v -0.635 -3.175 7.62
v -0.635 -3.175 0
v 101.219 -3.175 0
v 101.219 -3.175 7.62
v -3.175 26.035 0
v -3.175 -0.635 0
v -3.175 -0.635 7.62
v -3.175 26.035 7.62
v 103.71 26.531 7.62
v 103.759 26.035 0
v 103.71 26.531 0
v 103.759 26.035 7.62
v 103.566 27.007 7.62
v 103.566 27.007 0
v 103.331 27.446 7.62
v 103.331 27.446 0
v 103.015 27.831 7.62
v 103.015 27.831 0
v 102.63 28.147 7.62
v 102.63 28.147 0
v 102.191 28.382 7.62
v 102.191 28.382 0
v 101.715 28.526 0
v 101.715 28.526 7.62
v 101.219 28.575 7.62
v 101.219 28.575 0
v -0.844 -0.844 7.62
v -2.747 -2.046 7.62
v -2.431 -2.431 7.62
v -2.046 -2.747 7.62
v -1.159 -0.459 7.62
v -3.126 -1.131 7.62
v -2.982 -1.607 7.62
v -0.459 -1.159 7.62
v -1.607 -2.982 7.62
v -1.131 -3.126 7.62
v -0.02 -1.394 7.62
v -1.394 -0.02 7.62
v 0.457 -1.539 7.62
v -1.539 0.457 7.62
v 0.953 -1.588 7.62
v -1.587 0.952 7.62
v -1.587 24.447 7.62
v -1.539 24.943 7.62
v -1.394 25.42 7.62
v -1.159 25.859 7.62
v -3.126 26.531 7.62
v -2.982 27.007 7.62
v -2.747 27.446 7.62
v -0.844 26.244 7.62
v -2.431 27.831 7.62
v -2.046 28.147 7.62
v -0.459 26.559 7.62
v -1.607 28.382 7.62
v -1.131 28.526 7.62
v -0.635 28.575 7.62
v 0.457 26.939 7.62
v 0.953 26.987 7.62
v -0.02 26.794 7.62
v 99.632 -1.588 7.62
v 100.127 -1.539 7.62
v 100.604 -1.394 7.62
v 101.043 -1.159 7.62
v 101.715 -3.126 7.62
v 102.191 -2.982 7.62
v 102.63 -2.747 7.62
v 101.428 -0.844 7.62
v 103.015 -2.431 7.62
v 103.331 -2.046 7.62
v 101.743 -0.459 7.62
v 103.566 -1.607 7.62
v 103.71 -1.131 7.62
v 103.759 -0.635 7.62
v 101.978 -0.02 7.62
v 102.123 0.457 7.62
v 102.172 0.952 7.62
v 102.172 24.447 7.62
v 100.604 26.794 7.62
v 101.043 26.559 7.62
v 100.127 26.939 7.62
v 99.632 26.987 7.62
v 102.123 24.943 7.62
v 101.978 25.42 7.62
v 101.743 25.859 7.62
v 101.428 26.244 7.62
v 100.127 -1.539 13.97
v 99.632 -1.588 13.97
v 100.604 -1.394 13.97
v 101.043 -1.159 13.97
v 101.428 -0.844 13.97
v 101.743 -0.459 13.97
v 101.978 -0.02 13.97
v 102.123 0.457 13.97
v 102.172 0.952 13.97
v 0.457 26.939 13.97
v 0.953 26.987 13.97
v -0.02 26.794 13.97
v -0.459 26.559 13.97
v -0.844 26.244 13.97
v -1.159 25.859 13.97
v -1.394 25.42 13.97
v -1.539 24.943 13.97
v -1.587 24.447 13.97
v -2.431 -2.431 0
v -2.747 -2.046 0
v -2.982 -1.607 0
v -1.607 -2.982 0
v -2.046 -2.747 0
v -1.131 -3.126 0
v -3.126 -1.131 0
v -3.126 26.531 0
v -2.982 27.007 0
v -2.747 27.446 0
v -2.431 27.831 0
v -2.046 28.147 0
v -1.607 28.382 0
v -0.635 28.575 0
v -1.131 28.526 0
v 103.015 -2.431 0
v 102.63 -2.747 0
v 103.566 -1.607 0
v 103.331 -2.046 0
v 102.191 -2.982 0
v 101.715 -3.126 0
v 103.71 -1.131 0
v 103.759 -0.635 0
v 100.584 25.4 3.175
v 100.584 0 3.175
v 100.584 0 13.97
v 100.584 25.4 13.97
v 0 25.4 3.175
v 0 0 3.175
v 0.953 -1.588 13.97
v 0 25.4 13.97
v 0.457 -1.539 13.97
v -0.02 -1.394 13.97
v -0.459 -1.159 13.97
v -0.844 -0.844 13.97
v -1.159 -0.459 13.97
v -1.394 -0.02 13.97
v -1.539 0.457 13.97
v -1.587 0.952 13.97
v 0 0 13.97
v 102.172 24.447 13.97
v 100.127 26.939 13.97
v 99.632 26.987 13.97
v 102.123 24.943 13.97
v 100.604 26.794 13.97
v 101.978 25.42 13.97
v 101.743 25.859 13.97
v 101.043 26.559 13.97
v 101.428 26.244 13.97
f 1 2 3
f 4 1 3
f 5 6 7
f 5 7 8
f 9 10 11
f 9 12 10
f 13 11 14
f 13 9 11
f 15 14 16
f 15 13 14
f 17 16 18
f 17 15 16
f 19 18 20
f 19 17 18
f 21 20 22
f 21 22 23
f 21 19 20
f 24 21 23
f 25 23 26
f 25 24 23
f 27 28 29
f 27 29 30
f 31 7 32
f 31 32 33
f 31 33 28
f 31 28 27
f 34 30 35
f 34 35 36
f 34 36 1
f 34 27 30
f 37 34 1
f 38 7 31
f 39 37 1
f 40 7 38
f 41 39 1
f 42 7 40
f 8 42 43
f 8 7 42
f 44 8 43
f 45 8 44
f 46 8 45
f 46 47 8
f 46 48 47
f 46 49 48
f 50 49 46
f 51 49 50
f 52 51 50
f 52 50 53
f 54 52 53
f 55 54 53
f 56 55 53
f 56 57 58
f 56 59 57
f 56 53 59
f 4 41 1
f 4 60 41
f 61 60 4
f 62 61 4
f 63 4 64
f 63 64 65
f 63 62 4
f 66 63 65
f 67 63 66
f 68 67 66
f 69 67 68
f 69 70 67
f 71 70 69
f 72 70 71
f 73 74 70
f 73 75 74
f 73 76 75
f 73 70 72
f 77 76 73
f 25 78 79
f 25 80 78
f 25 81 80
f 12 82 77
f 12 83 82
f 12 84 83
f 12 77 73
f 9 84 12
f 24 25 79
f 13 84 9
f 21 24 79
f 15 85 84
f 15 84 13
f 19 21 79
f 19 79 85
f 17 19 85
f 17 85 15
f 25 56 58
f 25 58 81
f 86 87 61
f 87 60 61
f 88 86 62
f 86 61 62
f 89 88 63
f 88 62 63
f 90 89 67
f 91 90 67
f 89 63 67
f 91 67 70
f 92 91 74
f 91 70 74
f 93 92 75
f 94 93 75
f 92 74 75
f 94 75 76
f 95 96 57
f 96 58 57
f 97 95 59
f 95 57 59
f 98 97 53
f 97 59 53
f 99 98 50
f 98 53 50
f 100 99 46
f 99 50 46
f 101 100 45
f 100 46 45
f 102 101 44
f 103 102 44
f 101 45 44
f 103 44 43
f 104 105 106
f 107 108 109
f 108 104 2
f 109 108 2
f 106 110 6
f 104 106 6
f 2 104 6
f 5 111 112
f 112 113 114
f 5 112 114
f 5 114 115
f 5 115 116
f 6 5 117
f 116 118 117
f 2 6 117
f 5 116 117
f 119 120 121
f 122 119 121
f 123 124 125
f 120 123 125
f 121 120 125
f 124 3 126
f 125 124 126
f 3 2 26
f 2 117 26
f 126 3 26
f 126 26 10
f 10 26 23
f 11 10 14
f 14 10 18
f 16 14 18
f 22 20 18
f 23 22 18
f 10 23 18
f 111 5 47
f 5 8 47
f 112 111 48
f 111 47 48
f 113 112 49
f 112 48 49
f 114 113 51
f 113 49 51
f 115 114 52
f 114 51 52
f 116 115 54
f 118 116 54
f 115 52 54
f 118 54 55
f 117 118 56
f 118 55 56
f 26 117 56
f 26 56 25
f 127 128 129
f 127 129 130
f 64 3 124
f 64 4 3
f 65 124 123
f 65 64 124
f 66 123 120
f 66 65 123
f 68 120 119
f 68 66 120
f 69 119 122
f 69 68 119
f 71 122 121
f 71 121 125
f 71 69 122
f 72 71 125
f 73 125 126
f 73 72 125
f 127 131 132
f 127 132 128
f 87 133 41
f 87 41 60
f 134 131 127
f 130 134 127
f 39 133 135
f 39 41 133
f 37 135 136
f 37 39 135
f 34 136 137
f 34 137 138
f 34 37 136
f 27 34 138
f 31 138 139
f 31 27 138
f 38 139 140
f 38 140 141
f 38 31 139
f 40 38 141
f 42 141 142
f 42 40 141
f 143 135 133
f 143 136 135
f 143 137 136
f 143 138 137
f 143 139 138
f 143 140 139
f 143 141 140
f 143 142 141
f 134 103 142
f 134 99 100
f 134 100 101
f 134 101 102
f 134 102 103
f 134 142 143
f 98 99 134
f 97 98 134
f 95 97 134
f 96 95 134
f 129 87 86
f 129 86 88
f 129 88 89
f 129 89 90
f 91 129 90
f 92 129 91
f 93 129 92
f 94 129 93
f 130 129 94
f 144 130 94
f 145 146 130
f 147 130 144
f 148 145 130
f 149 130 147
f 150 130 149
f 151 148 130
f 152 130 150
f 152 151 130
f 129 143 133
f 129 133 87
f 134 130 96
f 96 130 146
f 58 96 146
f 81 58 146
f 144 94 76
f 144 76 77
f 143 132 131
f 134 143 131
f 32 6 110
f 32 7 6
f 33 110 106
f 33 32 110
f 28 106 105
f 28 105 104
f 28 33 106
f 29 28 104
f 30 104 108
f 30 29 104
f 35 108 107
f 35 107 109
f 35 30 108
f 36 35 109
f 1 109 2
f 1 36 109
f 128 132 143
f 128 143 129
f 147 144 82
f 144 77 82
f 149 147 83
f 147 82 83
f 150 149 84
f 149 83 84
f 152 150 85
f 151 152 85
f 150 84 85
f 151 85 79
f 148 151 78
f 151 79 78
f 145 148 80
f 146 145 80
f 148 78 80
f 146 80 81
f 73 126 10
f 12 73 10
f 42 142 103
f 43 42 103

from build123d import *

# Parameters (mm, degrees)
F0_W     = 106.934
F0_H     = 31.75
F0_W_2   = 100.584
F0_H_2   = 25.4
F1_DEPTH = 13.97
F2_DEPTH = 3.175
F3_W     = 106.934
F3_H     = 31.75
F3_W_2   = 103.759
F3_H_2   = 28.575
F4_DEPTH = 6.35
F5_R     = 2.54


with BuildPart() as f1:
    # F0 (on Top) → F1 (new body)
    with BuildSketch(Plane.XY):
        with Locations((50.292, 12.7)):
            Rectangle(F0_W, F0_H)
        with Locations((50.292, 12.7)):
            Rectangle(F0_W_2, F0_H_2, mode=Mode.SUBTRACT)
    extrude(amount=F1_DEPTH)

    # F0 (on Top) → F2 (join)
    with BuildSketch(Plane.XY):
        with Locations((50.292, 12.7)):
            Rectangle(F0_W_2, F0_H_2)
    extrude(amount=F2_DEPTH)

    # F3 (on face) → F4 (cut)
    with BuildSketch(Plane.XY.offset(13.97)):
        with Locations((50.292, 12.7)):
            Rectangle(F3_W, F3_H)
        with Locations((50.292, 12.7)):
            Rectangle(F3_W_2, F3_H_2, mode=Mode.SUBTRACT)
    extrude(amount=-F4_DEPTH, mode=Mode.SUBTRACT)

    # F5
    f5_edges = [f1.edges().sort_by_distance(p)[0] for p in [
        (-1.5875, -1.5875, 10.795),
        (-3.175, -3.175, 3.81),
        (-1.5875, 26.9875, 10.795),
        (-3.175, 28.575, 3.81),
        (102.1715, -1.5875, 10.795),
        (103.759, -3.175, 3.81),
        (103.759, 28.575, 3.81),
        (102.1715, 26.9875, 10.795),
    ]]
    fillet(f5_edges, radius=F5_R)


solid = f1.part
